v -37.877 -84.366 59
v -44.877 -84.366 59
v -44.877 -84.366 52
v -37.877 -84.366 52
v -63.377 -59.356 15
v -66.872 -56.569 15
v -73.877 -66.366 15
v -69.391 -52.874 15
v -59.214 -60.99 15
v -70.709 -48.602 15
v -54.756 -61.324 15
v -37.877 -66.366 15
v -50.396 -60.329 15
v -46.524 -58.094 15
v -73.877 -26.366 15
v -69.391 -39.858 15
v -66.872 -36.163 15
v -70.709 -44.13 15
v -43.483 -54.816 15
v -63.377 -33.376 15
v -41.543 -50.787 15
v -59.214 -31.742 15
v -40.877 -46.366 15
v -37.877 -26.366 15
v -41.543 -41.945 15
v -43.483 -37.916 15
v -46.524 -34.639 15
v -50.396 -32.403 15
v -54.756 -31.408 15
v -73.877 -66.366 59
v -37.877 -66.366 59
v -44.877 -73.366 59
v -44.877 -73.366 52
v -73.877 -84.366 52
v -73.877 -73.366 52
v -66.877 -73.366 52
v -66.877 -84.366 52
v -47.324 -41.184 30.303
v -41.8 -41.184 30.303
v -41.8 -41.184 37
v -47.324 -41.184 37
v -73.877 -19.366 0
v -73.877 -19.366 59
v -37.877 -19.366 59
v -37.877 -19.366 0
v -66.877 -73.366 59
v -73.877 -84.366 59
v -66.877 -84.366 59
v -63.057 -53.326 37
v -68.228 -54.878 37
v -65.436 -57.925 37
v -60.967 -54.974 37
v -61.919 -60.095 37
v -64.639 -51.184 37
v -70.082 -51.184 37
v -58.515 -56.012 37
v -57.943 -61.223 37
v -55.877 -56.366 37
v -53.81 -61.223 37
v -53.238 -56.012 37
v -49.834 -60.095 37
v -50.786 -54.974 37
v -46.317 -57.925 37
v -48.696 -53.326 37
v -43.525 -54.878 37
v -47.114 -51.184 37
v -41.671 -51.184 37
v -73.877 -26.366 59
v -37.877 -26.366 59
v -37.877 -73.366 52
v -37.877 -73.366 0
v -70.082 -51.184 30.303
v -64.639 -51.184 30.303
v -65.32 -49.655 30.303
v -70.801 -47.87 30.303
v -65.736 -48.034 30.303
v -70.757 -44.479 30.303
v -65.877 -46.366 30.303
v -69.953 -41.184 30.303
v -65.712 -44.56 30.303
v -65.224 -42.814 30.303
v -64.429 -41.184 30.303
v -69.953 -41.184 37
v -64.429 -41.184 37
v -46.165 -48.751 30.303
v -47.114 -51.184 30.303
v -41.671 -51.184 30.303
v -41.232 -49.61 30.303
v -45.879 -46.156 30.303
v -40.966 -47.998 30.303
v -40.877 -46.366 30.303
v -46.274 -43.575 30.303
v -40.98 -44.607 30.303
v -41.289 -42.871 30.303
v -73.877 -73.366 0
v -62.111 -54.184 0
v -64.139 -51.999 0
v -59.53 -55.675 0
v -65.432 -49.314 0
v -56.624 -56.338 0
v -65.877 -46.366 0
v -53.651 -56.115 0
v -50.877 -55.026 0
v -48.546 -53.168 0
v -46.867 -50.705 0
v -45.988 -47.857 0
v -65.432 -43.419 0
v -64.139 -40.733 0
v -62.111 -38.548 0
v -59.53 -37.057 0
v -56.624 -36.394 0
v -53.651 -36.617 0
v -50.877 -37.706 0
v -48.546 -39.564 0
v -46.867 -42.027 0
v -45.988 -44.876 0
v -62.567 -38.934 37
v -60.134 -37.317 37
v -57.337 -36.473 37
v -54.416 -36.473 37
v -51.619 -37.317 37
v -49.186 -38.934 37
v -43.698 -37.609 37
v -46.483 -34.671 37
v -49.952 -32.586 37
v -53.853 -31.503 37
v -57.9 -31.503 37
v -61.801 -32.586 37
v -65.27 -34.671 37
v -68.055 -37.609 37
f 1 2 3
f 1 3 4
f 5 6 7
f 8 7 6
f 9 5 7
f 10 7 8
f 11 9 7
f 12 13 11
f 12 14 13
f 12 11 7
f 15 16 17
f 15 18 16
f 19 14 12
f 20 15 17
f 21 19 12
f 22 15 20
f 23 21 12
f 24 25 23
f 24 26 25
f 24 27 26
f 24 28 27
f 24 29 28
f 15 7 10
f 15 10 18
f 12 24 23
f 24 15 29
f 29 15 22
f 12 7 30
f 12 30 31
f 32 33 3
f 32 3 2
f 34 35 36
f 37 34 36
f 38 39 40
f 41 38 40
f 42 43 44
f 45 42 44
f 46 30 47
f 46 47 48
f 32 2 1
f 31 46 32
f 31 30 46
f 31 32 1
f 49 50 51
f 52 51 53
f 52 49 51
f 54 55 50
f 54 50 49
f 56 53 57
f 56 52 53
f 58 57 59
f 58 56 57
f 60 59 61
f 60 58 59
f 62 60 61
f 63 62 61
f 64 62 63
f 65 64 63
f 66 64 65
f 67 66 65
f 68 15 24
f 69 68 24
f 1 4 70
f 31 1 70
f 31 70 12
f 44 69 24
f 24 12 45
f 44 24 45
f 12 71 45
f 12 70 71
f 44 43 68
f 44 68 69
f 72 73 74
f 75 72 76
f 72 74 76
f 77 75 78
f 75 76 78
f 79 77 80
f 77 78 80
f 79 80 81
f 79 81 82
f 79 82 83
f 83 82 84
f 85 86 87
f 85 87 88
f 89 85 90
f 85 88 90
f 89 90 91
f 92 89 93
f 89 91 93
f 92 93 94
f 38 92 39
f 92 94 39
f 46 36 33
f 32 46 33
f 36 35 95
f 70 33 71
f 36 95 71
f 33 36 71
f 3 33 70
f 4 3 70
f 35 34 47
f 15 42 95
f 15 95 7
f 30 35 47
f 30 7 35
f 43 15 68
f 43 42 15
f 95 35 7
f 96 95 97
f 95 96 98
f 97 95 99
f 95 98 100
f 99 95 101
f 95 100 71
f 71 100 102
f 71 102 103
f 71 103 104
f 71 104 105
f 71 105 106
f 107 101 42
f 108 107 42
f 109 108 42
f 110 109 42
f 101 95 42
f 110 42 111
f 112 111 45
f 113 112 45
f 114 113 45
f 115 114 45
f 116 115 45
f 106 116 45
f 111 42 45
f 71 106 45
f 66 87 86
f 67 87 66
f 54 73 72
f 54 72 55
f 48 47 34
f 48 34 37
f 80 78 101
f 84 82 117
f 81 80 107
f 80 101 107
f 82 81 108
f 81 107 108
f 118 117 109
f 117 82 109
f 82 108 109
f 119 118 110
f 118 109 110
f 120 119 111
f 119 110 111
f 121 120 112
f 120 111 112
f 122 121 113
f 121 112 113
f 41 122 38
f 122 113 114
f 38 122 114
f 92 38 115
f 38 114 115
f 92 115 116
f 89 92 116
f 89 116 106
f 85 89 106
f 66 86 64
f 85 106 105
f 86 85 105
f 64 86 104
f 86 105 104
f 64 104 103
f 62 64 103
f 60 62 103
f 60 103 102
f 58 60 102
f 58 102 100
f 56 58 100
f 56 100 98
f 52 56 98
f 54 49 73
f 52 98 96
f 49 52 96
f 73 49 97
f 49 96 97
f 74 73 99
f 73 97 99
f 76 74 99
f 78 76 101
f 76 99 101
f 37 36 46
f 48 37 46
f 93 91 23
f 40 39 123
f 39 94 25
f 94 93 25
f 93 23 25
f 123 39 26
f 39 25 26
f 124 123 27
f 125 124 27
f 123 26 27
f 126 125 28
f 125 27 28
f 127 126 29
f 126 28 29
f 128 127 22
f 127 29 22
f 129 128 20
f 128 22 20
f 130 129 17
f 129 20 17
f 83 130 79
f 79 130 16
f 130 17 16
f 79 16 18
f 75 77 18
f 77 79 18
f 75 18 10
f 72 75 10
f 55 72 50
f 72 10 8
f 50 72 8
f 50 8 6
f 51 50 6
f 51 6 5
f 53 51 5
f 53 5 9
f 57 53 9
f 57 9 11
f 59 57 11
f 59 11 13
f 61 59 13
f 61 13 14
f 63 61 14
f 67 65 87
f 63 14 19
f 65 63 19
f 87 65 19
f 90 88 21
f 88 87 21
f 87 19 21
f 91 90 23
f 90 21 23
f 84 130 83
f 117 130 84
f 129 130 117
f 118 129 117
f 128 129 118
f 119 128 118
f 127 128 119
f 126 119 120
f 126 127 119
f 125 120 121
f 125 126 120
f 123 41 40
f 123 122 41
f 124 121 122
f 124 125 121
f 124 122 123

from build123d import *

# Parameters (mm, degrees)
F0_W      = 36
F0_H      = 54
F1_DEPTH  = 15
F2_W      = 36
F2_H      = 7
F3_DEPTH  = 44
F4_R      = 15
F5_DEPTH  = 22
F7_D      = 20
F8_W      = 5
F8_H      = 7
F9_DEPTH  = 9999
F10_W     = 7
F10_H     = 7
F11_DEPTH = 11


with BuildPart() as f1:
    # F0 (on Top) → F1 (new body)
    with BuildSketch(Plane.XY):
        with Locations((-55.876545, -46.366083)):
            Rectangle(F0_W, F0_H)
    extrude(amount=F1_DEPTH)

    # F2 (on face) → F3 (join)
    with BuildSketch(Plane.XY.offset(15)):
        with Locations((-55.876545, -22.866083)):
            Rectangle(F2_W, F2_H)
        with Locations((-55.876545, -69.866083)):
            Rectangle(F2_W, F2_H)
    extrude(amount=F3_DEPTH)

    # F4 (on face) → F5 (join)
    with BuildSketch(Plane.XY.offset(15)):
        with Locations((-55.876545, -46.366083)):
            Circle(F4_R)
    extrude(amount=F5_DEPTH)

    # F7 (through all)
    with Locations(Plane.XY.offset(37)):
        with Locations((-55.876545, -46.366083)):
            Hole(F7_D / 2)

    # F8 (on Right) → F9 (cut)
    with BuildSketch(Plane.YZ):
        with Locations((-48.684213, 33.802636)):
            Rectangle(F8_W, F8_H)
        with Locations((-43.684213, 33.802636)):
            Rectangle(F8_W, F8_H)
    extrude(amount=-F9_DEPTH, mode=Mode.SUBTRACT)

    # F10 (on face) → F11 (join)
    with BuildSketch(Plane.XZ.offset(73.366083)):
        with Locations((-70.376545, 55.5)):
            Rectangle(F10_W, F10_H)
        with Locations((-41.376545, 55.5)):
            Rectangle(F10_W, F10_H)
    extrude(amount=F11_DEPTH)


solid = f1.part
